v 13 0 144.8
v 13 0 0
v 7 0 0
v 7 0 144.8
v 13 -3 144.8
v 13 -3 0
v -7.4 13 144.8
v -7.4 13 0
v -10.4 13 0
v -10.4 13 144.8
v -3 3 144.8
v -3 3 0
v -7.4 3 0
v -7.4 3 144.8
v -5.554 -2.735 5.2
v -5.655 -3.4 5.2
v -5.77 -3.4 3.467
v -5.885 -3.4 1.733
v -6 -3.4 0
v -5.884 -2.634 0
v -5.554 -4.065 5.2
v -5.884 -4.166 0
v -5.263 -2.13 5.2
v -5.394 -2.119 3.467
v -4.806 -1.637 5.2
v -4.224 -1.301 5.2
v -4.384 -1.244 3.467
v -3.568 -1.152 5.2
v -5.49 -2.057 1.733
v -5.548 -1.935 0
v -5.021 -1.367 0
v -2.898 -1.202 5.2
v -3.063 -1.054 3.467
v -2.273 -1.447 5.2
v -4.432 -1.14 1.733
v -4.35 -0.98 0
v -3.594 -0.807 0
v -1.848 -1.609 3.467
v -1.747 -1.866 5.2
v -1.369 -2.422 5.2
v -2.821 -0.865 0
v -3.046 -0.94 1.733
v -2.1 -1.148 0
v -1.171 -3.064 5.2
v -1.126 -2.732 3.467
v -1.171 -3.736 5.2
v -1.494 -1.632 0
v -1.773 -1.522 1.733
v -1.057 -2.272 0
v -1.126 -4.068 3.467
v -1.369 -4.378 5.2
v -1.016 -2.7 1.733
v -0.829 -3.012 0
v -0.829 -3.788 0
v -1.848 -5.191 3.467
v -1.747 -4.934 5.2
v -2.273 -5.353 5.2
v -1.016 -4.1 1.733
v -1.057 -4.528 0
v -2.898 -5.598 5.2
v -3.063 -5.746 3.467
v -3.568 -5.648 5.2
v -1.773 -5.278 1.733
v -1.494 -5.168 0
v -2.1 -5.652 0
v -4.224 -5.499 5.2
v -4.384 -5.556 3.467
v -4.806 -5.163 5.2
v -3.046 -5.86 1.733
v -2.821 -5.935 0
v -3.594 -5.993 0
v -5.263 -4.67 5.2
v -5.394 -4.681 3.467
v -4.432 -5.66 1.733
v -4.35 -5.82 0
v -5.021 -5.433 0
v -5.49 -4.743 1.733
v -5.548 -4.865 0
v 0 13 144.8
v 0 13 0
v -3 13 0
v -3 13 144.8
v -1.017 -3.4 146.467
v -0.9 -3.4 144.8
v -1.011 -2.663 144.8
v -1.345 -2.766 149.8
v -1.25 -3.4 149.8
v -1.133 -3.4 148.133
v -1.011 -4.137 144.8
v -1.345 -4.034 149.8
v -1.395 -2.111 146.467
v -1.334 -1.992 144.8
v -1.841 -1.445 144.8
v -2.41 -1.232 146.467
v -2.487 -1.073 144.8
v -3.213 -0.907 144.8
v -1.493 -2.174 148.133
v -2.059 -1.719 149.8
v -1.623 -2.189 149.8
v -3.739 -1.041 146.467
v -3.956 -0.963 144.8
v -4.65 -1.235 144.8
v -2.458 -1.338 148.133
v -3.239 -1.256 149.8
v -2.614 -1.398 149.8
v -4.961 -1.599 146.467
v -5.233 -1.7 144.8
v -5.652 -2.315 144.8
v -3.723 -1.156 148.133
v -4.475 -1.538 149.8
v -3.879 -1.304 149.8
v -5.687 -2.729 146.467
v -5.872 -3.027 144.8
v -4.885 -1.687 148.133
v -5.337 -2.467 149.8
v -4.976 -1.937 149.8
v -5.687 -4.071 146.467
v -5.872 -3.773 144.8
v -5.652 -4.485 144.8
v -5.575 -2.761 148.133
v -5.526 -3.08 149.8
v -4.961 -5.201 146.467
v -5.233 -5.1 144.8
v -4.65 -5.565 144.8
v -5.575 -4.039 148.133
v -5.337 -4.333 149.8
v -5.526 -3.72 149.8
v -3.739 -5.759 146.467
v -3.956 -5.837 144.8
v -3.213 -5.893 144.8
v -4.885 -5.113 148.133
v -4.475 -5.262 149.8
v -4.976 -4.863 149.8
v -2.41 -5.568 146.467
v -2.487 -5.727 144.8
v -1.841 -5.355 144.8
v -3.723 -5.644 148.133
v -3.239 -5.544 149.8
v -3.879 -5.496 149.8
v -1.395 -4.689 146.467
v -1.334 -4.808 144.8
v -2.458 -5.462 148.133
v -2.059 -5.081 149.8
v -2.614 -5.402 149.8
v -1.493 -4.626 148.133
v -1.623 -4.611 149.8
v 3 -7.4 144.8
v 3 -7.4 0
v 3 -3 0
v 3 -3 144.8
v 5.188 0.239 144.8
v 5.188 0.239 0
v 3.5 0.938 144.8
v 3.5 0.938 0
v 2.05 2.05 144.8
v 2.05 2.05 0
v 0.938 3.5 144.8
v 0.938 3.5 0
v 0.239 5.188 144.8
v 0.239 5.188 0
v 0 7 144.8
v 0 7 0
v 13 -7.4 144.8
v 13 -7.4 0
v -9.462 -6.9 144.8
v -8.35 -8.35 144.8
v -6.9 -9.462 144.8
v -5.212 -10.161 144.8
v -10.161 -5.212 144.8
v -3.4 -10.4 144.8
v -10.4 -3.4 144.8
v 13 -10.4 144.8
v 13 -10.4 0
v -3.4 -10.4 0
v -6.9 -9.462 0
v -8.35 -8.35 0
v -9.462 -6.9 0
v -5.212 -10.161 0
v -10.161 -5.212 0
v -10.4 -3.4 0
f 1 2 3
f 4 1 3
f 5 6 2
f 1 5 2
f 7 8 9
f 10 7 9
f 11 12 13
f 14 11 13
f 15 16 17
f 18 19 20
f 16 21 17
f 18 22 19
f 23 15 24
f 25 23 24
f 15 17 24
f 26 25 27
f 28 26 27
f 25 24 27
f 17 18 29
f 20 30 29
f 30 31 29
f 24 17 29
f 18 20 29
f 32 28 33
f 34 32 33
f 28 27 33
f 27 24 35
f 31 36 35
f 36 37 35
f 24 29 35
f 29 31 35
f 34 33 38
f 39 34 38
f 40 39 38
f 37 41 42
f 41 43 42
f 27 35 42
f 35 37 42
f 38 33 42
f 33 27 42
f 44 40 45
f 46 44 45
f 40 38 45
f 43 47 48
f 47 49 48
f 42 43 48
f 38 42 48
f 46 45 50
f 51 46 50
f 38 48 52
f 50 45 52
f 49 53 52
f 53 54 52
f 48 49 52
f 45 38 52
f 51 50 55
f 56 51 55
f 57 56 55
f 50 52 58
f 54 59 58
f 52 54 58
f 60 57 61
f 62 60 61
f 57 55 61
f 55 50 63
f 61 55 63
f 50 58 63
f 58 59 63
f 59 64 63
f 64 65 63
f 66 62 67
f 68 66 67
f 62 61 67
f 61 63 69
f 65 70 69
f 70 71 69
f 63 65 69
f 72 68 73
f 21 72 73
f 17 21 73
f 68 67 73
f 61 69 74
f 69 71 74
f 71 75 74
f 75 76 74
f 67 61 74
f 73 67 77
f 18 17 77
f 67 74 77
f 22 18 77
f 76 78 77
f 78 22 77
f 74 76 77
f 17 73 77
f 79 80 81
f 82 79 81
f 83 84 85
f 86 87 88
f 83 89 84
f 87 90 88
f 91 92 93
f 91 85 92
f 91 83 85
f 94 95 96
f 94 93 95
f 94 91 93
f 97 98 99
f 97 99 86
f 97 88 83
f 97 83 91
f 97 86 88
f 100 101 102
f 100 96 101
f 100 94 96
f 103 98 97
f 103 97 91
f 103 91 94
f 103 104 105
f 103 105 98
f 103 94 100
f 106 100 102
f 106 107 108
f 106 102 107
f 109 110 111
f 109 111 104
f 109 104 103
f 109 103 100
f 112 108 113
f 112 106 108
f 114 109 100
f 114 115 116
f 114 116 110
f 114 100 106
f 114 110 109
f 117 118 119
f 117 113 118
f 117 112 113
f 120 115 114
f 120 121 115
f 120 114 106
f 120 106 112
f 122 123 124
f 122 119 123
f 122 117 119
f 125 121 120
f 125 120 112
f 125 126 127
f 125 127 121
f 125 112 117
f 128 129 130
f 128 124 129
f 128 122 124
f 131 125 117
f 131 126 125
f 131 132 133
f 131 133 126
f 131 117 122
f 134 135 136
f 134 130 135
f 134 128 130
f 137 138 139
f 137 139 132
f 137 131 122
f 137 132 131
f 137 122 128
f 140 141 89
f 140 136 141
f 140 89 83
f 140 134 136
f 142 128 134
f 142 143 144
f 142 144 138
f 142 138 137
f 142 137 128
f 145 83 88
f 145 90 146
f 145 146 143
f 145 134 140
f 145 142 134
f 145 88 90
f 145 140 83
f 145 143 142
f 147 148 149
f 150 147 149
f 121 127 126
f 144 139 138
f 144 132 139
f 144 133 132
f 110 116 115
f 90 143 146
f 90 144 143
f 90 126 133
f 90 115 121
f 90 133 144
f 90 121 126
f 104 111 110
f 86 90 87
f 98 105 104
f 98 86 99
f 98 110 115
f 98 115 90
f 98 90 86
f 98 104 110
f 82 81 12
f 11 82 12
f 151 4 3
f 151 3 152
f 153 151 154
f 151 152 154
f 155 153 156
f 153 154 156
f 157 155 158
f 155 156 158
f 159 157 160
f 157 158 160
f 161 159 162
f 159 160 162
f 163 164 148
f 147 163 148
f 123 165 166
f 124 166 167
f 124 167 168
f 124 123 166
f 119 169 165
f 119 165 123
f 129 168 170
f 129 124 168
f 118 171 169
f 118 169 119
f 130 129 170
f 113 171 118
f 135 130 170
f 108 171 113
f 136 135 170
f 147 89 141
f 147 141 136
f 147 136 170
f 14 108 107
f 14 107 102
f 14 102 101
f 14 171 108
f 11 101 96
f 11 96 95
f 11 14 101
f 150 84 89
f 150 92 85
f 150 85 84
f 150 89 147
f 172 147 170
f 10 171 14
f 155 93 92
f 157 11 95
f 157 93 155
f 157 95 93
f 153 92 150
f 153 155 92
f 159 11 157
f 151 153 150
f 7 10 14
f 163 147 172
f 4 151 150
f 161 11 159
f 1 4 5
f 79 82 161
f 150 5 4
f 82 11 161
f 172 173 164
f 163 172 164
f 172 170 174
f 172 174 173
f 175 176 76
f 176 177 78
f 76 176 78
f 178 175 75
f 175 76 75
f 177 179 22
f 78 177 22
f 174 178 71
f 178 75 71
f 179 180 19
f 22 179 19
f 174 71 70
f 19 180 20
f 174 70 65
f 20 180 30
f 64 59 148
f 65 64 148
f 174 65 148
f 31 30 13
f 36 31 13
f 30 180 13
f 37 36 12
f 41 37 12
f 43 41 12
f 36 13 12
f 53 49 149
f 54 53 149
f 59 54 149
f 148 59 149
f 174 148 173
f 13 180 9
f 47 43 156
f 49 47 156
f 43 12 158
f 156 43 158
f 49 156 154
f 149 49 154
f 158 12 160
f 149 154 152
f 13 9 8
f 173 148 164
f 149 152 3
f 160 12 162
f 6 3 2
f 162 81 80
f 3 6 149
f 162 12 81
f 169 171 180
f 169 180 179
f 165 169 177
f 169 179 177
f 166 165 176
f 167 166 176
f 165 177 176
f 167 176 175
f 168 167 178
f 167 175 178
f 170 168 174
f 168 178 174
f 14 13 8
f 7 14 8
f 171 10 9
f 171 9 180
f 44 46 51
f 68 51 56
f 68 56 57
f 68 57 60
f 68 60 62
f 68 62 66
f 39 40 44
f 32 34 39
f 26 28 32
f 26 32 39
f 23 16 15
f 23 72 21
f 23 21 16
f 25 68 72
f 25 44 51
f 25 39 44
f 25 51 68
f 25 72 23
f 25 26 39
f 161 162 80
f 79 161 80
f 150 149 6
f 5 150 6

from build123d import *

# Parameters (mm, degrees)
EXTRUDE1_DEPTH     = 144.8
SKETCH2_R          = 2.5
EXTRUDE2_DEPTH     = 5
EXTRUDE2_TAPER     = 4
SKETCH3_R          = 2.6
CUT_EXTRUDE1_DEPTH = 5.2
CUT_EXTRUDE1_DRAFT = -3.8


with BuildPart() as part:
    # Sketch1 → Extrude1 (new body)
    with BuildSketch(Plane.XY):
        with BuildLine():
            Line((-3.4, -10.4), (13, -10.4))
            Line((13, -10.4), (13, -7.4))
            Line((13, -7.4), (3, -7.4))
            Line((3, -7.4), (3, -3))
            Line((3, -3), (13, -3))
            Line((13, -3), (13, 0))
            Line((13, 0), (7, 0))
            ThreePointArc((7, 0), (2.050252532, 2.050252532), (0, 7))
            Line((0, 7), (0, 13))
            Line((0, 13), (-3, 13))
            Line((-3, 13), (-3, 3))
            Line((-3, 3), (-7.4, 3))
            Line((-7.4, 3), (-7.4, 13))
            Line((-7.4, 13), (-10.4, 13))
            Line((-10.4, 13), (-10.4, -3.4))
            ThreePointArc((-10.4, -3.4), (-8.349747468, -8.349747468), (-3.4, -10.4))
        make_face()
    extrude(amount=EXTRUDE1_DEPTH)

    # Sketch2 → Extrude2 (add)
    with BuildSketch(Plane.XY.offset(144.8)):
        with Locations((-3.4, -3.4)):
            Circle(SKETCH2_R)
    extrude(amount=EXTRUDE2_DEPTH, taper=EXTRUDE2_TAPER)


with BuildPart() as cut_extrude1_tool:
    # Sketch3 → Cut-Extrude1 (with draft: the straight prism first)
    with BuildSketch(Plane(origin=(0, 0, 0), x_dir=(-1, 0, 0), z_dir=(0, 0, -1))):
        with Locations((3.4, -3.4)):
            Circle(SKETCH3_R)
    extrude(amount=-CUT_EXTRUDE1_DEPTH)
    # Cut-Extrude1: the draft: its side faces are tilted about the plane it starts from
    cut_extrude1_sides = [cut_extrude1_tool.faces().sort_by_distance(p)[0] for p in [
        (-0.8, -3.4, 2.6),
    ]]
    draft(cut_extrude1_sides, Plane(origin=(0, 0, 0), x_dir=(-1, 0, 0), z_dir=(0, 0, -1)), CUT_EXTRUDE1_DRAFT)


with BuildPart() as part_1:
    add(part.part)

    # Cut-Extrude1: cut by cut_extrude1_tool
    add(cut_extrude1_tool.part, mode=Mode.SUBTRACT)


solid = part_1.part
